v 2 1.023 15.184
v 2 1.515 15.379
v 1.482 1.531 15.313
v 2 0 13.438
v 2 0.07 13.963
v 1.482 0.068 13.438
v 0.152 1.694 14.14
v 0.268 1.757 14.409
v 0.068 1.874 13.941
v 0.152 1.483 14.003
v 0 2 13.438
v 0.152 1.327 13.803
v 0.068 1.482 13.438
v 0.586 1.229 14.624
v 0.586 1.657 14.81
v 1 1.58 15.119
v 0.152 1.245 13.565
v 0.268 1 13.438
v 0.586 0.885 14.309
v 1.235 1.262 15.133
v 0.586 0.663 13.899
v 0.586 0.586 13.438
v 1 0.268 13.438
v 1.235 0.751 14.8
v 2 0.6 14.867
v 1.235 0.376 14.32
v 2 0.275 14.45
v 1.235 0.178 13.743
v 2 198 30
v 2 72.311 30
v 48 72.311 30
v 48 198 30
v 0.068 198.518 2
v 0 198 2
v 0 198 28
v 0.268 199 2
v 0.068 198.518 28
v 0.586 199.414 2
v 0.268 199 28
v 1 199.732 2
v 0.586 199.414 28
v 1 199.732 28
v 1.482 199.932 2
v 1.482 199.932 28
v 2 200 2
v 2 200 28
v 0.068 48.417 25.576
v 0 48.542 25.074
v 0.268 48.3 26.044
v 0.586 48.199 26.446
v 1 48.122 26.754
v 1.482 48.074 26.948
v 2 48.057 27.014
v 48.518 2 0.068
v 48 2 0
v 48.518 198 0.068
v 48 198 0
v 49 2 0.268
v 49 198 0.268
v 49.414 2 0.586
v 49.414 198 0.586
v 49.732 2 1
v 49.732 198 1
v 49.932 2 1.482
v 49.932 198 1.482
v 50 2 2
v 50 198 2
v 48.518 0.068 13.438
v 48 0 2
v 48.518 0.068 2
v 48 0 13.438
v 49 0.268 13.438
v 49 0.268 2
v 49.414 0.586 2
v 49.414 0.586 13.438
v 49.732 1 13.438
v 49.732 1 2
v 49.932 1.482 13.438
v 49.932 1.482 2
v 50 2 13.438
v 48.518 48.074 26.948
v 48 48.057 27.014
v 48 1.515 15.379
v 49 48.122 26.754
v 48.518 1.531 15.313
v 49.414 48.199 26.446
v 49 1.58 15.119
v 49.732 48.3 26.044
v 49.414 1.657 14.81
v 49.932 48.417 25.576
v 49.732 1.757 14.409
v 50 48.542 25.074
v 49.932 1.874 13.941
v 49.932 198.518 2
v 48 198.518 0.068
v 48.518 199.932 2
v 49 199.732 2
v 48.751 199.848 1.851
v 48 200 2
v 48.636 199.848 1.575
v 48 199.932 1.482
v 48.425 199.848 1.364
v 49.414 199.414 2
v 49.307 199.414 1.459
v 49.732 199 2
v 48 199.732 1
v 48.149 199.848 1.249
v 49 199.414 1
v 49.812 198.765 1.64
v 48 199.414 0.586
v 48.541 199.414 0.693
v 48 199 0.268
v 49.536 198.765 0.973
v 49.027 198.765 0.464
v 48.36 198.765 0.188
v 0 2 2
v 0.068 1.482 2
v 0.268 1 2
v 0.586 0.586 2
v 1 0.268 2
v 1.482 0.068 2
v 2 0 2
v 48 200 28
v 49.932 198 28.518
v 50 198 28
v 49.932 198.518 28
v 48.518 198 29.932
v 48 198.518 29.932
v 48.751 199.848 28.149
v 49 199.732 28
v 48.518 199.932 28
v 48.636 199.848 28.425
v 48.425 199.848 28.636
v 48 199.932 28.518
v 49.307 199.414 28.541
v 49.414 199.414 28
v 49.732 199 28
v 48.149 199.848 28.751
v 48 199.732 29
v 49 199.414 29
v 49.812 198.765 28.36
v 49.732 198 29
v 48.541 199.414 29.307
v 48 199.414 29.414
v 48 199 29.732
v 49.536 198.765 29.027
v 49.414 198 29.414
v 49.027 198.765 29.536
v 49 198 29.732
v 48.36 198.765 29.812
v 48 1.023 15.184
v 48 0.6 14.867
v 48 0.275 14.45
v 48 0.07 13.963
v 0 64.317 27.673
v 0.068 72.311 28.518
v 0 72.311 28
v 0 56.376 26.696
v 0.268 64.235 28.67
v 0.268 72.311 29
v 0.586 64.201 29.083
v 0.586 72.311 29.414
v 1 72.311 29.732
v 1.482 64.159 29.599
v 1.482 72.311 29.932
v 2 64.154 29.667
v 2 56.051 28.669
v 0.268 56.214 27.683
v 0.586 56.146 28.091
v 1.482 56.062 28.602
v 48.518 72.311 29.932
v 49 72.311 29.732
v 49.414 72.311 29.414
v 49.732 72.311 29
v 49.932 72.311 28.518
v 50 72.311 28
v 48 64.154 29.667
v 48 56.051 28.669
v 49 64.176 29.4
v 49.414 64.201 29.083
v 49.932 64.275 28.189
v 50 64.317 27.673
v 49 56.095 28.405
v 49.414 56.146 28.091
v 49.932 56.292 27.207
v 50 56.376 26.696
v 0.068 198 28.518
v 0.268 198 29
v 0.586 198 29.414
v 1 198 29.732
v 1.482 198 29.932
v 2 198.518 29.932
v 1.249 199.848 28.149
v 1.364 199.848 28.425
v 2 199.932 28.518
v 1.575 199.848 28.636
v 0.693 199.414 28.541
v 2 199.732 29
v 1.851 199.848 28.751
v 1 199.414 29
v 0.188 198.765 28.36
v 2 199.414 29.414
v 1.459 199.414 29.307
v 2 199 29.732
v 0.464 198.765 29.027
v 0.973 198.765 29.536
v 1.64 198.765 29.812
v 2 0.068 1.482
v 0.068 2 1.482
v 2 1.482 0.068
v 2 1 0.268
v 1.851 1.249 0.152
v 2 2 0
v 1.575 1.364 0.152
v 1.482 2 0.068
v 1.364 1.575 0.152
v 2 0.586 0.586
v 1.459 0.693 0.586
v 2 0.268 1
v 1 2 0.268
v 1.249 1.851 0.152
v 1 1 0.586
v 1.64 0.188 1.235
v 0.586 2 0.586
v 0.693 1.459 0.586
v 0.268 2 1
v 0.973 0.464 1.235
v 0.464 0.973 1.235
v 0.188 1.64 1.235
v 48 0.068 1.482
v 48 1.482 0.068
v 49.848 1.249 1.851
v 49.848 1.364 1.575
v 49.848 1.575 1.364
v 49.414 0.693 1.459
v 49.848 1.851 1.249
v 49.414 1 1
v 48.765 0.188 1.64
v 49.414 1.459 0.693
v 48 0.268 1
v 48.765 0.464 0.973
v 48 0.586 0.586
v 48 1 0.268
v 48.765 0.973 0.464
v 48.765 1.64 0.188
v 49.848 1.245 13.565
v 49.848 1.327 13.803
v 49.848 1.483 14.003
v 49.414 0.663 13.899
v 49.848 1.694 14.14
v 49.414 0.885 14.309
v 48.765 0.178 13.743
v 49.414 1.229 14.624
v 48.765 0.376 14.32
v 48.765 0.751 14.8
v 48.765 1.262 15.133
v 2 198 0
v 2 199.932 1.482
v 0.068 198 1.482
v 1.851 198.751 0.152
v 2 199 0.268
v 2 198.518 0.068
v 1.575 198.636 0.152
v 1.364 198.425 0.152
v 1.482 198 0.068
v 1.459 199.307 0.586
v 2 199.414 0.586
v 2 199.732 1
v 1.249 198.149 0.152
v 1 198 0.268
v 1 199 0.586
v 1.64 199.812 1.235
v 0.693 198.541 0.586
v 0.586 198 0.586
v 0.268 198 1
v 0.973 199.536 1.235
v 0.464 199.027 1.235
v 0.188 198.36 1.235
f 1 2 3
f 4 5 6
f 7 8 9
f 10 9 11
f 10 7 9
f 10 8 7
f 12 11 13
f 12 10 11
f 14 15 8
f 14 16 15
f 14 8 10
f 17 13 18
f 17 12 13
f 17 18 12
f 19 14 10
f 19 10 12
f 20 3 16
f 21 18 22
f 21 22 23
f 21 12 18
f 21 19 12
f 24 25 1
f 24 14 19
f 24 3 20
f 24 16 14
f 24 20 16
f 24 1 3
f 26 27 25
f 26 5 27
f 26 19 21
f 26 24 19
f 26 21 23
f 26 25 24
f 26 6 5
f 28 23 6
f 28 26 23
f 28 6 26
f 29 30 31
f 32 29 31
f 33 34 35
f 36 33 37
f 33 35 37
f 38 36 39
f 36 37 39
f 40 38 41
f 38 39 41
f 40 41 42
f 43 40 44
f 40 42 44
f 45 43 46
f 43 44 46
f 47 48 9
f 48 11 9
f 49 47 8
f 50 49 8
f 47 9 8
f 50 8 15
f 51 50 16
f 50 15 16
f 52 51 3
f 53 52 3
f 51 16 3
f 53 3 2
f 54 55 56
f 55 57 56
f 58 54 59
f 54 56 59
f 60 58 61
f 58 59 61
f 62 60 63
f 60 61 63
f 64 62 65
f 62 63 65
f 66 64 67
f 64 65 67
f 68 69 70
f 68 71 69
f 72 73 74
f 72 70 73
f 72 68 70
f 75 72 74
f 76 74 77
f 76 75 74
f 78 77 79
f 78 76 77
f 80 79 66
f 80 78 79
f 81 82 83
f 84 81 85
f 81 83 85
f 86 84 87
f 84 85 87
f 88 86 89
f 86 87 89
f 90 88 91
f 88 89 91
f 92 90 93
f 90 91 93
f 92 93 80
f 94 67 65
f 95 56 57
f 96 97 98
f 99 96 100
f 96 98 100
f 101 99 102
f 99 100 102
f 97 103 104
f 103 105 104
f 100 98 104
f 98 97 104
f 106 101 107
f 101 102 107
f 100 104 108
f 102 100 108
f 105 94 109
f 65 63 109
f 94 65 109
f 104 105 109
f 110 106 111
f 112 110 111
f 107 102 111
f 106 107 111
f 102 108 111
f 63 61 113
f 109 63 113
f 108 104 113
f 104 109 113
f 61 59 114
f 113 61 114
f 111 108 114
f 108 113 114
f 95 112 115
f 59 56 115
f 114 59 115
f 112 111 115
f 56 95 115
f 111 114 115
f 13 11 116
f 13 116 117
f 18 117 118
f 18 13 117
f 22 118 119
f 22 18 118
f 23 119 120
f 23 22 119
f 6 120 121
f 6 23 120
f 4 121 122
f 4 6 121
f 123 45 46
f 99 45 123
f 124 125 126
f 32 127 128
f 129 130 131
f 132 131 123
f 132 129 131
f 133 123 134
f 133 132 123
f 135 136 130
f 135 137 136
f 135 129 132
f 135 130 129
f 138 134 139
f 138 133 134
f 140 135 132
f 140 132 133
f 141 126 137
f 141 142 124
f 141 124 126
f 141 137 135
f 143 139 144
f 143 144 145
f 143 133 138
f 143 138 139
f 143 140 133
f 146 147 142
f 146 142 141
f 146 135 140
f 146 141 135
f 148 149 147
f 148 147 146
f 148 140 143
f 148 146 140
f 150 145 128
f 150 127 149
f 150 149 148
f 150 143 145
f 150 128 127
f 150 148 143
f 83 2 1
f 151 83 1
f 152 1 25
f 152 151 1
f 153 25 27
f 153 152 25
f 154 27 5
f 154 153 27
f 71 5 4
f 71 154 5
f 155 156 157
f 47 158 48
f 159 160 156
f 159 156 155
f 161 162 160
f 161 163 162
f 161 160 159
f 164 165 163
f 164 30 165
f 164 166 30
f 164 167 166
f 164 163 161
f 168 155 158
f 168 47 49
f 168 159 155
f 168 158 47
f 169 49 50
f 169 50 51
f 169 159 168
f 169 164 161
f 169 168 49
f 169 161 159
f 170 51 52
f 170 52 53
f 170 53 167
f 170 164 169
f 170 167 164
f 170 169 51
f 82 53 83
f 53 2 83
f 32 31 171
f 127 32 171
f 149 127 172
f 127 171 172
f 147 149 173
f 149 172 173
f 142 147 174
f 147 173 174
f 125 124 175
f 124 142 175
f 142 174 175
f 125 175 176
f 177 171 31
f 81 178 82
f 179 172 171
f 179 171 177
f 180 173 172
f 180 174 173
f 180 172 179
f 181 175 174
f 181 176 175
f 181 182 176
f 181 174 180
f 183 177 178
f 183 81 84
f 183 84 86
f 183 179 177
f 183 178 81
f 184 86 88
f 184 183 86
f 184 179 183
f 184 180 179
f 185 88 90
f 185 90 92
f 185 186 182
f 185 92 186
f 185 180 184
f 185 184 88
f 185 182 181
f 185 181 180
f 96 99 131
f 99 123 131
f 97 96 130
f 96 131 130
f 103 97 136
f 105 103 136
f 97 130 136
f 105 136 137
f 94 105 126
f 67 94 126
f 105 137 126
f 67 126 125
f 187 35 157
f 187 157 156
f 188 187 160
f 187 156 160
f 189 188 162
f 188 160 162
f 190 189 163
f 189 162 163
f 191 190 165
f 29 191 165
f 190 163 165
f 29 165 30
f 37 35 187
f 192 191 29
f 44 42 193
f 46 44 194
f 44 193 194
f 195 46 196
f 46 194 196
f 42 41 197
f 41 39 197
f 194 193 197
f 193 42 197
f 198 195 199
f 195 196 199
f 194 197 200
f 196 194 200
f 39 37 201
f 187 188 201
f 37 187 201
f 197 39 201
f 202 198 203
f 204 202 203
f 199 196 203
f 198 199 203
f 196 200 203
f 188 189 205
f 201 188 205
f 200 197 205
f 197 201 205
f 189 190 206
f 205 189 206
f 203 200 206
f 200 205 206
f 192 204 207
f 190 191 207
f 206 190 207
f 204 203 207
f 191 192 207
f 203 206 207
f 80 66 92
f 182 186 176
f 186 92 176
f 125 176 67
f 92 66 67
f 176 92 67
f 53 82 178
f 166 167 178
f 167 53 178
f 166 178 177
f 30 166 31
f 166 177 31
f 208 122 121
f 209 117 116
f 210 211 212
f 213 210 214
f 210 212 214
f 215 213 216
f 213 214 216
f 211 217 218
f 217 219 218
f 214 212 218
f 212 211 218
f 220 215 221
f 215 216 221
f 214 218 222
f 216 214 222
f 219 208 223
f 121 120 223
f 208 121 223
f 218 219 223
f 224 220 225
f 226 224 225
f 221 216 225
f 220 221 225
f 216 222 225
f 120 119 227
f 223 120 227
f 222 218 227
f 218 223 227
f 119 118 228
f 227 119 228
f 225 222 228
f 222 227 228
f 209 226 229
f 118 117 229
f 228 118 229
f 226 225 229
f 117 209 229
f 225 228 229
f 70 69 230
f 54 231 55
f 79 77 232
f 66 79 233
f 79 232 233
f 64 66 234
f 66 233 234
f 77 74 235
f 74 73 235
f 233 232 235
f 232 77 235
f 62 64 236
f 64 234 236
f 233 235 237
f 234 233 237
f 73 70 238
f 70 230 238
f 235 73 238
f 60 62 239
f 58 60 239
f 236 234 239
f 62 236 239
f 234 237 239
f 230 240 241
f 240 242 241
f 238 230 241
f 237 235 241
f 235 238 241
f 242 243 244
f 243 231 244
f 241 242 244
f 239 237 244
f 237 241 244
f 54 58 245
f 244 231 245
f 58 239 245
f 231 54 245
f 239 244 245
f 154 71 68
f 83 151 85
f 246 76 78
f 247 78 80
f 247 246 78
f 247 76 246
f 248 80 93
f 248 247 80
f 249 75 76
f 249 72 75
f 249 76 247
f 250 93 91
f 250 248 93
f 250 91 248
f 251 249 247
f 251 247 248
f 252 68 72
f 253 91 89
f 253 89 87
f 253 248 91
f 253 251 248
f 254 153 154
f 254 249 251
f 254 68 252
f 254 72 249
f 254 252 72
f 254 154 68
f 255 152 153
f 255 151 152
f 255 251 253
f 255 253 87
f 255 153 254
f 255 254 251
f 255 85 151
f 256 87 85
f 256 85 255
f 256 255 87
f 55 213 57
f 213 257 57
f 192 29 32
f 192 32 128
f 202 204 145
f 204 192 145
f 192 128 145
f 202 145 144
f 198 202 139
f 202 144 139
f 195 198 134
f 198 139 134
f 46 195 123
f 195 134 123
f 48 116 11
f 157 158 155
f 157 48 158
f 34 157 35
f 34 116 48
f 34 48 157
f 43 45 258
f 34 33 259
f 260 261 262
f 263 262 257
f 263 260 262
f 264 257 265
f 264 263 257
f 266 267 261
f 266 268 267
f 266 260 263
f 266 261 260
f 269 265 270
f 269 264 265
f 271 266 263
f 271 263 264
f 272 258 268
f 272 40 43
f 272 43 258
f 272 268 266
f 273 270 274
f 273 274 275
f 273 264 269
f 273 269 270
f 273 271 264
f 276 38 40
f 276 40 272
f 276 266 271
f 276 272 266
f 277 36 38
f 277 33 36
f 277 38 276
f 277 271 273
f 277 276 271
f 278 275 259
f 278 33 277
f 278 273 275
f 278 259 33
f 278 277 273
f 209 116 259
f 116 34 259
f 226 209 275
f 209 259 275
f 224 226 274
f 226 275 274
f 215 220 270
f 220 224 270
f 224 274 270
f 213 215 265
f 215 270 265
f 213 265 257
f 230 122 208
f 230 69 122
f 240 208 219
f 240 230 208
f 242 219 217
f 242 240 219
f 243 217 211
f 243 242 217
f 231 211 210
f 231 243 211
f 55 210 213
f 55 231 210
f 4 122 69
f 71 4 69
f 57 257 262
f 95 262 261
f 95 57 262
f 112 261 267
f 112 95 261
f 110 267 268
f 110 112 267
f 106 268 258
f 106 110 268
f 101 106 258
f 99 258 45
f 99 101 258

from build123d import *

# Parameters (mm, degrees)
F0_W     = 50
F0_H     = 200
F1_DEPTH = 30
F2_SIZE2 = 15
F2_SIZE  = 60
F3_R     = 100
F4_R     = 2


with BuildPart() as f1:
    # F0 (on Top) → F1 (new body)
    with BuildSketch(Plane.XY):
        with Locations((25, 100)):
            Rectangle(F0_W, F0_H)
    extrude(amount=F1_DEPTH)

    # F2
    f2_edges = [f1.edges().sort_by_distance(p)[0] for p in [
        (25, 0, 30),
    ]]
    f2_side = f1.faces().sort_by_distance((25, 100, 30))[0]
    chamfer(f2_edges, length=F2_SIZE, length2=F2_SIZE2, reference=f2_side)

    # F3
    f3_edges = [f1.edges().sort_by_distance(p)[0] for p in [
        (25, 60, 30),
    ]]
    fillet(f3_edges, radius=F3_R)

    # F4
    f4_edges = [f1.edges().sort_by_distance(p)[0] for p in [
        (0, 0, 7.5),
        (25, 0, 15),
        (25, 0, 0),
        (50, 0, 7.5),
        (50, 24.0285, 21.007125),
        (50, 60.092236, 29.250756),
        (50, 136.155281, 30),
        (50, 100, 0),
        (50, 200, 15),
        (0, 24.0285, 21.007125),
        (25, 48.057, 27.01425),
        (0, 136.155281, 30),
        (0, 60.092236, 29.250756),
        (0, 200, 15),
        (25, 200, 0),
        (25, 200, 30),
        (0, 100, 0),
        (25, 72.310563, 30),
    ]]
    fillet(f4_edges, radius=F4_R)


solid = f1.part
